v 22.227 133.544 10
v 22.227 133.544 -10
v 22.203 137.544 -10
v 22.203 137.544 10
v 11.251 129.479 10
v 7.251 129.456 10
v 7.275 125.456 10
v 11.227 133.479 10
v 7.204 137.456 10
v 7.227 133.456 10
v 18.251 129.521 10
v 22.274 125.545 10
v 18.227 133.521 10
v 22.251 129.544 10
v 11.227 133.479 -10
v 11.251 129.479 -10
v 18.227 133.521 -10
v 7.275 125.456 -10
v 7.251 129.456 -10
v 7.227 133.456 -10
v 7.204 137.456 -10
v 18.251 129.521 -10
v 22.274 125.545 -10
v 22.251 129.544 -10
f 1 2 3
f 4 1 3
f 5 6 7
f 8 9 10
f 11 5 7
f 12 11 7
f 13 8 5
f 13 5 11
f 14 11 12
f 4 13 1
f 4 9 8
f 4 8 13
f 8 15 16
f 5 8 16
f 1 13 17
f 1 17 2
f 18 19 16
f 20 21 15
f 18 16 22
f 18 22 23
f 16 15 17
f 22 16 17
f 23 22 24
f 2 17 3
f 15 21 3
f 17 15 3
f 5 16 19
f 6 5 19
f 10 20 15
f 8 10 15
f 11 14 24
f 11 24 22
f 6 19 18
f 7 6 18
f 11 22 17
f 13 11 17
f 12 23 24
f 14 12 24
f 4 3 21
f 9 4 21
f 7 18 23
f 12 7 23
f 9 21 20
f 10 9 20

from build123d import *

# Parameters (mm, degrees)
BOSS_EXTRUDE1_DEPTH      = 10
BOSS_EXTRUDE1_DEPTH_BACK = 10


with BuildPart() as part:
    # Sketch1 → Boss-Extrude1 (new, two sides: drawn at the far end of the back side and taken through both)
    with BuildSketch(Plane.XY.offset(-BOSS_EXTRUDE1_DEPTH_BACK)):
        Polygon((7.274522478, 125.455869207), (22.274260332, 125.544550227), (22.25061206, 129.544480321), (18.250681966, 129.520832049), (18.227033694, 133.520762144), (22.226963788, 133.544410415), (22.203315516, 137.54434051), (7.203577663, 137.45565949), (7.227225935, 133.455729396), (11.227156029, 133.479377668), (11.250804301, 129.479447574), (7.250874206, 129.455799302), align=None)
    extrude(amount=BOSS_EXTRUDE1_DEPTH + BOSS_EXTRUDE1_DEPTH_BACK)


solid = part.part
